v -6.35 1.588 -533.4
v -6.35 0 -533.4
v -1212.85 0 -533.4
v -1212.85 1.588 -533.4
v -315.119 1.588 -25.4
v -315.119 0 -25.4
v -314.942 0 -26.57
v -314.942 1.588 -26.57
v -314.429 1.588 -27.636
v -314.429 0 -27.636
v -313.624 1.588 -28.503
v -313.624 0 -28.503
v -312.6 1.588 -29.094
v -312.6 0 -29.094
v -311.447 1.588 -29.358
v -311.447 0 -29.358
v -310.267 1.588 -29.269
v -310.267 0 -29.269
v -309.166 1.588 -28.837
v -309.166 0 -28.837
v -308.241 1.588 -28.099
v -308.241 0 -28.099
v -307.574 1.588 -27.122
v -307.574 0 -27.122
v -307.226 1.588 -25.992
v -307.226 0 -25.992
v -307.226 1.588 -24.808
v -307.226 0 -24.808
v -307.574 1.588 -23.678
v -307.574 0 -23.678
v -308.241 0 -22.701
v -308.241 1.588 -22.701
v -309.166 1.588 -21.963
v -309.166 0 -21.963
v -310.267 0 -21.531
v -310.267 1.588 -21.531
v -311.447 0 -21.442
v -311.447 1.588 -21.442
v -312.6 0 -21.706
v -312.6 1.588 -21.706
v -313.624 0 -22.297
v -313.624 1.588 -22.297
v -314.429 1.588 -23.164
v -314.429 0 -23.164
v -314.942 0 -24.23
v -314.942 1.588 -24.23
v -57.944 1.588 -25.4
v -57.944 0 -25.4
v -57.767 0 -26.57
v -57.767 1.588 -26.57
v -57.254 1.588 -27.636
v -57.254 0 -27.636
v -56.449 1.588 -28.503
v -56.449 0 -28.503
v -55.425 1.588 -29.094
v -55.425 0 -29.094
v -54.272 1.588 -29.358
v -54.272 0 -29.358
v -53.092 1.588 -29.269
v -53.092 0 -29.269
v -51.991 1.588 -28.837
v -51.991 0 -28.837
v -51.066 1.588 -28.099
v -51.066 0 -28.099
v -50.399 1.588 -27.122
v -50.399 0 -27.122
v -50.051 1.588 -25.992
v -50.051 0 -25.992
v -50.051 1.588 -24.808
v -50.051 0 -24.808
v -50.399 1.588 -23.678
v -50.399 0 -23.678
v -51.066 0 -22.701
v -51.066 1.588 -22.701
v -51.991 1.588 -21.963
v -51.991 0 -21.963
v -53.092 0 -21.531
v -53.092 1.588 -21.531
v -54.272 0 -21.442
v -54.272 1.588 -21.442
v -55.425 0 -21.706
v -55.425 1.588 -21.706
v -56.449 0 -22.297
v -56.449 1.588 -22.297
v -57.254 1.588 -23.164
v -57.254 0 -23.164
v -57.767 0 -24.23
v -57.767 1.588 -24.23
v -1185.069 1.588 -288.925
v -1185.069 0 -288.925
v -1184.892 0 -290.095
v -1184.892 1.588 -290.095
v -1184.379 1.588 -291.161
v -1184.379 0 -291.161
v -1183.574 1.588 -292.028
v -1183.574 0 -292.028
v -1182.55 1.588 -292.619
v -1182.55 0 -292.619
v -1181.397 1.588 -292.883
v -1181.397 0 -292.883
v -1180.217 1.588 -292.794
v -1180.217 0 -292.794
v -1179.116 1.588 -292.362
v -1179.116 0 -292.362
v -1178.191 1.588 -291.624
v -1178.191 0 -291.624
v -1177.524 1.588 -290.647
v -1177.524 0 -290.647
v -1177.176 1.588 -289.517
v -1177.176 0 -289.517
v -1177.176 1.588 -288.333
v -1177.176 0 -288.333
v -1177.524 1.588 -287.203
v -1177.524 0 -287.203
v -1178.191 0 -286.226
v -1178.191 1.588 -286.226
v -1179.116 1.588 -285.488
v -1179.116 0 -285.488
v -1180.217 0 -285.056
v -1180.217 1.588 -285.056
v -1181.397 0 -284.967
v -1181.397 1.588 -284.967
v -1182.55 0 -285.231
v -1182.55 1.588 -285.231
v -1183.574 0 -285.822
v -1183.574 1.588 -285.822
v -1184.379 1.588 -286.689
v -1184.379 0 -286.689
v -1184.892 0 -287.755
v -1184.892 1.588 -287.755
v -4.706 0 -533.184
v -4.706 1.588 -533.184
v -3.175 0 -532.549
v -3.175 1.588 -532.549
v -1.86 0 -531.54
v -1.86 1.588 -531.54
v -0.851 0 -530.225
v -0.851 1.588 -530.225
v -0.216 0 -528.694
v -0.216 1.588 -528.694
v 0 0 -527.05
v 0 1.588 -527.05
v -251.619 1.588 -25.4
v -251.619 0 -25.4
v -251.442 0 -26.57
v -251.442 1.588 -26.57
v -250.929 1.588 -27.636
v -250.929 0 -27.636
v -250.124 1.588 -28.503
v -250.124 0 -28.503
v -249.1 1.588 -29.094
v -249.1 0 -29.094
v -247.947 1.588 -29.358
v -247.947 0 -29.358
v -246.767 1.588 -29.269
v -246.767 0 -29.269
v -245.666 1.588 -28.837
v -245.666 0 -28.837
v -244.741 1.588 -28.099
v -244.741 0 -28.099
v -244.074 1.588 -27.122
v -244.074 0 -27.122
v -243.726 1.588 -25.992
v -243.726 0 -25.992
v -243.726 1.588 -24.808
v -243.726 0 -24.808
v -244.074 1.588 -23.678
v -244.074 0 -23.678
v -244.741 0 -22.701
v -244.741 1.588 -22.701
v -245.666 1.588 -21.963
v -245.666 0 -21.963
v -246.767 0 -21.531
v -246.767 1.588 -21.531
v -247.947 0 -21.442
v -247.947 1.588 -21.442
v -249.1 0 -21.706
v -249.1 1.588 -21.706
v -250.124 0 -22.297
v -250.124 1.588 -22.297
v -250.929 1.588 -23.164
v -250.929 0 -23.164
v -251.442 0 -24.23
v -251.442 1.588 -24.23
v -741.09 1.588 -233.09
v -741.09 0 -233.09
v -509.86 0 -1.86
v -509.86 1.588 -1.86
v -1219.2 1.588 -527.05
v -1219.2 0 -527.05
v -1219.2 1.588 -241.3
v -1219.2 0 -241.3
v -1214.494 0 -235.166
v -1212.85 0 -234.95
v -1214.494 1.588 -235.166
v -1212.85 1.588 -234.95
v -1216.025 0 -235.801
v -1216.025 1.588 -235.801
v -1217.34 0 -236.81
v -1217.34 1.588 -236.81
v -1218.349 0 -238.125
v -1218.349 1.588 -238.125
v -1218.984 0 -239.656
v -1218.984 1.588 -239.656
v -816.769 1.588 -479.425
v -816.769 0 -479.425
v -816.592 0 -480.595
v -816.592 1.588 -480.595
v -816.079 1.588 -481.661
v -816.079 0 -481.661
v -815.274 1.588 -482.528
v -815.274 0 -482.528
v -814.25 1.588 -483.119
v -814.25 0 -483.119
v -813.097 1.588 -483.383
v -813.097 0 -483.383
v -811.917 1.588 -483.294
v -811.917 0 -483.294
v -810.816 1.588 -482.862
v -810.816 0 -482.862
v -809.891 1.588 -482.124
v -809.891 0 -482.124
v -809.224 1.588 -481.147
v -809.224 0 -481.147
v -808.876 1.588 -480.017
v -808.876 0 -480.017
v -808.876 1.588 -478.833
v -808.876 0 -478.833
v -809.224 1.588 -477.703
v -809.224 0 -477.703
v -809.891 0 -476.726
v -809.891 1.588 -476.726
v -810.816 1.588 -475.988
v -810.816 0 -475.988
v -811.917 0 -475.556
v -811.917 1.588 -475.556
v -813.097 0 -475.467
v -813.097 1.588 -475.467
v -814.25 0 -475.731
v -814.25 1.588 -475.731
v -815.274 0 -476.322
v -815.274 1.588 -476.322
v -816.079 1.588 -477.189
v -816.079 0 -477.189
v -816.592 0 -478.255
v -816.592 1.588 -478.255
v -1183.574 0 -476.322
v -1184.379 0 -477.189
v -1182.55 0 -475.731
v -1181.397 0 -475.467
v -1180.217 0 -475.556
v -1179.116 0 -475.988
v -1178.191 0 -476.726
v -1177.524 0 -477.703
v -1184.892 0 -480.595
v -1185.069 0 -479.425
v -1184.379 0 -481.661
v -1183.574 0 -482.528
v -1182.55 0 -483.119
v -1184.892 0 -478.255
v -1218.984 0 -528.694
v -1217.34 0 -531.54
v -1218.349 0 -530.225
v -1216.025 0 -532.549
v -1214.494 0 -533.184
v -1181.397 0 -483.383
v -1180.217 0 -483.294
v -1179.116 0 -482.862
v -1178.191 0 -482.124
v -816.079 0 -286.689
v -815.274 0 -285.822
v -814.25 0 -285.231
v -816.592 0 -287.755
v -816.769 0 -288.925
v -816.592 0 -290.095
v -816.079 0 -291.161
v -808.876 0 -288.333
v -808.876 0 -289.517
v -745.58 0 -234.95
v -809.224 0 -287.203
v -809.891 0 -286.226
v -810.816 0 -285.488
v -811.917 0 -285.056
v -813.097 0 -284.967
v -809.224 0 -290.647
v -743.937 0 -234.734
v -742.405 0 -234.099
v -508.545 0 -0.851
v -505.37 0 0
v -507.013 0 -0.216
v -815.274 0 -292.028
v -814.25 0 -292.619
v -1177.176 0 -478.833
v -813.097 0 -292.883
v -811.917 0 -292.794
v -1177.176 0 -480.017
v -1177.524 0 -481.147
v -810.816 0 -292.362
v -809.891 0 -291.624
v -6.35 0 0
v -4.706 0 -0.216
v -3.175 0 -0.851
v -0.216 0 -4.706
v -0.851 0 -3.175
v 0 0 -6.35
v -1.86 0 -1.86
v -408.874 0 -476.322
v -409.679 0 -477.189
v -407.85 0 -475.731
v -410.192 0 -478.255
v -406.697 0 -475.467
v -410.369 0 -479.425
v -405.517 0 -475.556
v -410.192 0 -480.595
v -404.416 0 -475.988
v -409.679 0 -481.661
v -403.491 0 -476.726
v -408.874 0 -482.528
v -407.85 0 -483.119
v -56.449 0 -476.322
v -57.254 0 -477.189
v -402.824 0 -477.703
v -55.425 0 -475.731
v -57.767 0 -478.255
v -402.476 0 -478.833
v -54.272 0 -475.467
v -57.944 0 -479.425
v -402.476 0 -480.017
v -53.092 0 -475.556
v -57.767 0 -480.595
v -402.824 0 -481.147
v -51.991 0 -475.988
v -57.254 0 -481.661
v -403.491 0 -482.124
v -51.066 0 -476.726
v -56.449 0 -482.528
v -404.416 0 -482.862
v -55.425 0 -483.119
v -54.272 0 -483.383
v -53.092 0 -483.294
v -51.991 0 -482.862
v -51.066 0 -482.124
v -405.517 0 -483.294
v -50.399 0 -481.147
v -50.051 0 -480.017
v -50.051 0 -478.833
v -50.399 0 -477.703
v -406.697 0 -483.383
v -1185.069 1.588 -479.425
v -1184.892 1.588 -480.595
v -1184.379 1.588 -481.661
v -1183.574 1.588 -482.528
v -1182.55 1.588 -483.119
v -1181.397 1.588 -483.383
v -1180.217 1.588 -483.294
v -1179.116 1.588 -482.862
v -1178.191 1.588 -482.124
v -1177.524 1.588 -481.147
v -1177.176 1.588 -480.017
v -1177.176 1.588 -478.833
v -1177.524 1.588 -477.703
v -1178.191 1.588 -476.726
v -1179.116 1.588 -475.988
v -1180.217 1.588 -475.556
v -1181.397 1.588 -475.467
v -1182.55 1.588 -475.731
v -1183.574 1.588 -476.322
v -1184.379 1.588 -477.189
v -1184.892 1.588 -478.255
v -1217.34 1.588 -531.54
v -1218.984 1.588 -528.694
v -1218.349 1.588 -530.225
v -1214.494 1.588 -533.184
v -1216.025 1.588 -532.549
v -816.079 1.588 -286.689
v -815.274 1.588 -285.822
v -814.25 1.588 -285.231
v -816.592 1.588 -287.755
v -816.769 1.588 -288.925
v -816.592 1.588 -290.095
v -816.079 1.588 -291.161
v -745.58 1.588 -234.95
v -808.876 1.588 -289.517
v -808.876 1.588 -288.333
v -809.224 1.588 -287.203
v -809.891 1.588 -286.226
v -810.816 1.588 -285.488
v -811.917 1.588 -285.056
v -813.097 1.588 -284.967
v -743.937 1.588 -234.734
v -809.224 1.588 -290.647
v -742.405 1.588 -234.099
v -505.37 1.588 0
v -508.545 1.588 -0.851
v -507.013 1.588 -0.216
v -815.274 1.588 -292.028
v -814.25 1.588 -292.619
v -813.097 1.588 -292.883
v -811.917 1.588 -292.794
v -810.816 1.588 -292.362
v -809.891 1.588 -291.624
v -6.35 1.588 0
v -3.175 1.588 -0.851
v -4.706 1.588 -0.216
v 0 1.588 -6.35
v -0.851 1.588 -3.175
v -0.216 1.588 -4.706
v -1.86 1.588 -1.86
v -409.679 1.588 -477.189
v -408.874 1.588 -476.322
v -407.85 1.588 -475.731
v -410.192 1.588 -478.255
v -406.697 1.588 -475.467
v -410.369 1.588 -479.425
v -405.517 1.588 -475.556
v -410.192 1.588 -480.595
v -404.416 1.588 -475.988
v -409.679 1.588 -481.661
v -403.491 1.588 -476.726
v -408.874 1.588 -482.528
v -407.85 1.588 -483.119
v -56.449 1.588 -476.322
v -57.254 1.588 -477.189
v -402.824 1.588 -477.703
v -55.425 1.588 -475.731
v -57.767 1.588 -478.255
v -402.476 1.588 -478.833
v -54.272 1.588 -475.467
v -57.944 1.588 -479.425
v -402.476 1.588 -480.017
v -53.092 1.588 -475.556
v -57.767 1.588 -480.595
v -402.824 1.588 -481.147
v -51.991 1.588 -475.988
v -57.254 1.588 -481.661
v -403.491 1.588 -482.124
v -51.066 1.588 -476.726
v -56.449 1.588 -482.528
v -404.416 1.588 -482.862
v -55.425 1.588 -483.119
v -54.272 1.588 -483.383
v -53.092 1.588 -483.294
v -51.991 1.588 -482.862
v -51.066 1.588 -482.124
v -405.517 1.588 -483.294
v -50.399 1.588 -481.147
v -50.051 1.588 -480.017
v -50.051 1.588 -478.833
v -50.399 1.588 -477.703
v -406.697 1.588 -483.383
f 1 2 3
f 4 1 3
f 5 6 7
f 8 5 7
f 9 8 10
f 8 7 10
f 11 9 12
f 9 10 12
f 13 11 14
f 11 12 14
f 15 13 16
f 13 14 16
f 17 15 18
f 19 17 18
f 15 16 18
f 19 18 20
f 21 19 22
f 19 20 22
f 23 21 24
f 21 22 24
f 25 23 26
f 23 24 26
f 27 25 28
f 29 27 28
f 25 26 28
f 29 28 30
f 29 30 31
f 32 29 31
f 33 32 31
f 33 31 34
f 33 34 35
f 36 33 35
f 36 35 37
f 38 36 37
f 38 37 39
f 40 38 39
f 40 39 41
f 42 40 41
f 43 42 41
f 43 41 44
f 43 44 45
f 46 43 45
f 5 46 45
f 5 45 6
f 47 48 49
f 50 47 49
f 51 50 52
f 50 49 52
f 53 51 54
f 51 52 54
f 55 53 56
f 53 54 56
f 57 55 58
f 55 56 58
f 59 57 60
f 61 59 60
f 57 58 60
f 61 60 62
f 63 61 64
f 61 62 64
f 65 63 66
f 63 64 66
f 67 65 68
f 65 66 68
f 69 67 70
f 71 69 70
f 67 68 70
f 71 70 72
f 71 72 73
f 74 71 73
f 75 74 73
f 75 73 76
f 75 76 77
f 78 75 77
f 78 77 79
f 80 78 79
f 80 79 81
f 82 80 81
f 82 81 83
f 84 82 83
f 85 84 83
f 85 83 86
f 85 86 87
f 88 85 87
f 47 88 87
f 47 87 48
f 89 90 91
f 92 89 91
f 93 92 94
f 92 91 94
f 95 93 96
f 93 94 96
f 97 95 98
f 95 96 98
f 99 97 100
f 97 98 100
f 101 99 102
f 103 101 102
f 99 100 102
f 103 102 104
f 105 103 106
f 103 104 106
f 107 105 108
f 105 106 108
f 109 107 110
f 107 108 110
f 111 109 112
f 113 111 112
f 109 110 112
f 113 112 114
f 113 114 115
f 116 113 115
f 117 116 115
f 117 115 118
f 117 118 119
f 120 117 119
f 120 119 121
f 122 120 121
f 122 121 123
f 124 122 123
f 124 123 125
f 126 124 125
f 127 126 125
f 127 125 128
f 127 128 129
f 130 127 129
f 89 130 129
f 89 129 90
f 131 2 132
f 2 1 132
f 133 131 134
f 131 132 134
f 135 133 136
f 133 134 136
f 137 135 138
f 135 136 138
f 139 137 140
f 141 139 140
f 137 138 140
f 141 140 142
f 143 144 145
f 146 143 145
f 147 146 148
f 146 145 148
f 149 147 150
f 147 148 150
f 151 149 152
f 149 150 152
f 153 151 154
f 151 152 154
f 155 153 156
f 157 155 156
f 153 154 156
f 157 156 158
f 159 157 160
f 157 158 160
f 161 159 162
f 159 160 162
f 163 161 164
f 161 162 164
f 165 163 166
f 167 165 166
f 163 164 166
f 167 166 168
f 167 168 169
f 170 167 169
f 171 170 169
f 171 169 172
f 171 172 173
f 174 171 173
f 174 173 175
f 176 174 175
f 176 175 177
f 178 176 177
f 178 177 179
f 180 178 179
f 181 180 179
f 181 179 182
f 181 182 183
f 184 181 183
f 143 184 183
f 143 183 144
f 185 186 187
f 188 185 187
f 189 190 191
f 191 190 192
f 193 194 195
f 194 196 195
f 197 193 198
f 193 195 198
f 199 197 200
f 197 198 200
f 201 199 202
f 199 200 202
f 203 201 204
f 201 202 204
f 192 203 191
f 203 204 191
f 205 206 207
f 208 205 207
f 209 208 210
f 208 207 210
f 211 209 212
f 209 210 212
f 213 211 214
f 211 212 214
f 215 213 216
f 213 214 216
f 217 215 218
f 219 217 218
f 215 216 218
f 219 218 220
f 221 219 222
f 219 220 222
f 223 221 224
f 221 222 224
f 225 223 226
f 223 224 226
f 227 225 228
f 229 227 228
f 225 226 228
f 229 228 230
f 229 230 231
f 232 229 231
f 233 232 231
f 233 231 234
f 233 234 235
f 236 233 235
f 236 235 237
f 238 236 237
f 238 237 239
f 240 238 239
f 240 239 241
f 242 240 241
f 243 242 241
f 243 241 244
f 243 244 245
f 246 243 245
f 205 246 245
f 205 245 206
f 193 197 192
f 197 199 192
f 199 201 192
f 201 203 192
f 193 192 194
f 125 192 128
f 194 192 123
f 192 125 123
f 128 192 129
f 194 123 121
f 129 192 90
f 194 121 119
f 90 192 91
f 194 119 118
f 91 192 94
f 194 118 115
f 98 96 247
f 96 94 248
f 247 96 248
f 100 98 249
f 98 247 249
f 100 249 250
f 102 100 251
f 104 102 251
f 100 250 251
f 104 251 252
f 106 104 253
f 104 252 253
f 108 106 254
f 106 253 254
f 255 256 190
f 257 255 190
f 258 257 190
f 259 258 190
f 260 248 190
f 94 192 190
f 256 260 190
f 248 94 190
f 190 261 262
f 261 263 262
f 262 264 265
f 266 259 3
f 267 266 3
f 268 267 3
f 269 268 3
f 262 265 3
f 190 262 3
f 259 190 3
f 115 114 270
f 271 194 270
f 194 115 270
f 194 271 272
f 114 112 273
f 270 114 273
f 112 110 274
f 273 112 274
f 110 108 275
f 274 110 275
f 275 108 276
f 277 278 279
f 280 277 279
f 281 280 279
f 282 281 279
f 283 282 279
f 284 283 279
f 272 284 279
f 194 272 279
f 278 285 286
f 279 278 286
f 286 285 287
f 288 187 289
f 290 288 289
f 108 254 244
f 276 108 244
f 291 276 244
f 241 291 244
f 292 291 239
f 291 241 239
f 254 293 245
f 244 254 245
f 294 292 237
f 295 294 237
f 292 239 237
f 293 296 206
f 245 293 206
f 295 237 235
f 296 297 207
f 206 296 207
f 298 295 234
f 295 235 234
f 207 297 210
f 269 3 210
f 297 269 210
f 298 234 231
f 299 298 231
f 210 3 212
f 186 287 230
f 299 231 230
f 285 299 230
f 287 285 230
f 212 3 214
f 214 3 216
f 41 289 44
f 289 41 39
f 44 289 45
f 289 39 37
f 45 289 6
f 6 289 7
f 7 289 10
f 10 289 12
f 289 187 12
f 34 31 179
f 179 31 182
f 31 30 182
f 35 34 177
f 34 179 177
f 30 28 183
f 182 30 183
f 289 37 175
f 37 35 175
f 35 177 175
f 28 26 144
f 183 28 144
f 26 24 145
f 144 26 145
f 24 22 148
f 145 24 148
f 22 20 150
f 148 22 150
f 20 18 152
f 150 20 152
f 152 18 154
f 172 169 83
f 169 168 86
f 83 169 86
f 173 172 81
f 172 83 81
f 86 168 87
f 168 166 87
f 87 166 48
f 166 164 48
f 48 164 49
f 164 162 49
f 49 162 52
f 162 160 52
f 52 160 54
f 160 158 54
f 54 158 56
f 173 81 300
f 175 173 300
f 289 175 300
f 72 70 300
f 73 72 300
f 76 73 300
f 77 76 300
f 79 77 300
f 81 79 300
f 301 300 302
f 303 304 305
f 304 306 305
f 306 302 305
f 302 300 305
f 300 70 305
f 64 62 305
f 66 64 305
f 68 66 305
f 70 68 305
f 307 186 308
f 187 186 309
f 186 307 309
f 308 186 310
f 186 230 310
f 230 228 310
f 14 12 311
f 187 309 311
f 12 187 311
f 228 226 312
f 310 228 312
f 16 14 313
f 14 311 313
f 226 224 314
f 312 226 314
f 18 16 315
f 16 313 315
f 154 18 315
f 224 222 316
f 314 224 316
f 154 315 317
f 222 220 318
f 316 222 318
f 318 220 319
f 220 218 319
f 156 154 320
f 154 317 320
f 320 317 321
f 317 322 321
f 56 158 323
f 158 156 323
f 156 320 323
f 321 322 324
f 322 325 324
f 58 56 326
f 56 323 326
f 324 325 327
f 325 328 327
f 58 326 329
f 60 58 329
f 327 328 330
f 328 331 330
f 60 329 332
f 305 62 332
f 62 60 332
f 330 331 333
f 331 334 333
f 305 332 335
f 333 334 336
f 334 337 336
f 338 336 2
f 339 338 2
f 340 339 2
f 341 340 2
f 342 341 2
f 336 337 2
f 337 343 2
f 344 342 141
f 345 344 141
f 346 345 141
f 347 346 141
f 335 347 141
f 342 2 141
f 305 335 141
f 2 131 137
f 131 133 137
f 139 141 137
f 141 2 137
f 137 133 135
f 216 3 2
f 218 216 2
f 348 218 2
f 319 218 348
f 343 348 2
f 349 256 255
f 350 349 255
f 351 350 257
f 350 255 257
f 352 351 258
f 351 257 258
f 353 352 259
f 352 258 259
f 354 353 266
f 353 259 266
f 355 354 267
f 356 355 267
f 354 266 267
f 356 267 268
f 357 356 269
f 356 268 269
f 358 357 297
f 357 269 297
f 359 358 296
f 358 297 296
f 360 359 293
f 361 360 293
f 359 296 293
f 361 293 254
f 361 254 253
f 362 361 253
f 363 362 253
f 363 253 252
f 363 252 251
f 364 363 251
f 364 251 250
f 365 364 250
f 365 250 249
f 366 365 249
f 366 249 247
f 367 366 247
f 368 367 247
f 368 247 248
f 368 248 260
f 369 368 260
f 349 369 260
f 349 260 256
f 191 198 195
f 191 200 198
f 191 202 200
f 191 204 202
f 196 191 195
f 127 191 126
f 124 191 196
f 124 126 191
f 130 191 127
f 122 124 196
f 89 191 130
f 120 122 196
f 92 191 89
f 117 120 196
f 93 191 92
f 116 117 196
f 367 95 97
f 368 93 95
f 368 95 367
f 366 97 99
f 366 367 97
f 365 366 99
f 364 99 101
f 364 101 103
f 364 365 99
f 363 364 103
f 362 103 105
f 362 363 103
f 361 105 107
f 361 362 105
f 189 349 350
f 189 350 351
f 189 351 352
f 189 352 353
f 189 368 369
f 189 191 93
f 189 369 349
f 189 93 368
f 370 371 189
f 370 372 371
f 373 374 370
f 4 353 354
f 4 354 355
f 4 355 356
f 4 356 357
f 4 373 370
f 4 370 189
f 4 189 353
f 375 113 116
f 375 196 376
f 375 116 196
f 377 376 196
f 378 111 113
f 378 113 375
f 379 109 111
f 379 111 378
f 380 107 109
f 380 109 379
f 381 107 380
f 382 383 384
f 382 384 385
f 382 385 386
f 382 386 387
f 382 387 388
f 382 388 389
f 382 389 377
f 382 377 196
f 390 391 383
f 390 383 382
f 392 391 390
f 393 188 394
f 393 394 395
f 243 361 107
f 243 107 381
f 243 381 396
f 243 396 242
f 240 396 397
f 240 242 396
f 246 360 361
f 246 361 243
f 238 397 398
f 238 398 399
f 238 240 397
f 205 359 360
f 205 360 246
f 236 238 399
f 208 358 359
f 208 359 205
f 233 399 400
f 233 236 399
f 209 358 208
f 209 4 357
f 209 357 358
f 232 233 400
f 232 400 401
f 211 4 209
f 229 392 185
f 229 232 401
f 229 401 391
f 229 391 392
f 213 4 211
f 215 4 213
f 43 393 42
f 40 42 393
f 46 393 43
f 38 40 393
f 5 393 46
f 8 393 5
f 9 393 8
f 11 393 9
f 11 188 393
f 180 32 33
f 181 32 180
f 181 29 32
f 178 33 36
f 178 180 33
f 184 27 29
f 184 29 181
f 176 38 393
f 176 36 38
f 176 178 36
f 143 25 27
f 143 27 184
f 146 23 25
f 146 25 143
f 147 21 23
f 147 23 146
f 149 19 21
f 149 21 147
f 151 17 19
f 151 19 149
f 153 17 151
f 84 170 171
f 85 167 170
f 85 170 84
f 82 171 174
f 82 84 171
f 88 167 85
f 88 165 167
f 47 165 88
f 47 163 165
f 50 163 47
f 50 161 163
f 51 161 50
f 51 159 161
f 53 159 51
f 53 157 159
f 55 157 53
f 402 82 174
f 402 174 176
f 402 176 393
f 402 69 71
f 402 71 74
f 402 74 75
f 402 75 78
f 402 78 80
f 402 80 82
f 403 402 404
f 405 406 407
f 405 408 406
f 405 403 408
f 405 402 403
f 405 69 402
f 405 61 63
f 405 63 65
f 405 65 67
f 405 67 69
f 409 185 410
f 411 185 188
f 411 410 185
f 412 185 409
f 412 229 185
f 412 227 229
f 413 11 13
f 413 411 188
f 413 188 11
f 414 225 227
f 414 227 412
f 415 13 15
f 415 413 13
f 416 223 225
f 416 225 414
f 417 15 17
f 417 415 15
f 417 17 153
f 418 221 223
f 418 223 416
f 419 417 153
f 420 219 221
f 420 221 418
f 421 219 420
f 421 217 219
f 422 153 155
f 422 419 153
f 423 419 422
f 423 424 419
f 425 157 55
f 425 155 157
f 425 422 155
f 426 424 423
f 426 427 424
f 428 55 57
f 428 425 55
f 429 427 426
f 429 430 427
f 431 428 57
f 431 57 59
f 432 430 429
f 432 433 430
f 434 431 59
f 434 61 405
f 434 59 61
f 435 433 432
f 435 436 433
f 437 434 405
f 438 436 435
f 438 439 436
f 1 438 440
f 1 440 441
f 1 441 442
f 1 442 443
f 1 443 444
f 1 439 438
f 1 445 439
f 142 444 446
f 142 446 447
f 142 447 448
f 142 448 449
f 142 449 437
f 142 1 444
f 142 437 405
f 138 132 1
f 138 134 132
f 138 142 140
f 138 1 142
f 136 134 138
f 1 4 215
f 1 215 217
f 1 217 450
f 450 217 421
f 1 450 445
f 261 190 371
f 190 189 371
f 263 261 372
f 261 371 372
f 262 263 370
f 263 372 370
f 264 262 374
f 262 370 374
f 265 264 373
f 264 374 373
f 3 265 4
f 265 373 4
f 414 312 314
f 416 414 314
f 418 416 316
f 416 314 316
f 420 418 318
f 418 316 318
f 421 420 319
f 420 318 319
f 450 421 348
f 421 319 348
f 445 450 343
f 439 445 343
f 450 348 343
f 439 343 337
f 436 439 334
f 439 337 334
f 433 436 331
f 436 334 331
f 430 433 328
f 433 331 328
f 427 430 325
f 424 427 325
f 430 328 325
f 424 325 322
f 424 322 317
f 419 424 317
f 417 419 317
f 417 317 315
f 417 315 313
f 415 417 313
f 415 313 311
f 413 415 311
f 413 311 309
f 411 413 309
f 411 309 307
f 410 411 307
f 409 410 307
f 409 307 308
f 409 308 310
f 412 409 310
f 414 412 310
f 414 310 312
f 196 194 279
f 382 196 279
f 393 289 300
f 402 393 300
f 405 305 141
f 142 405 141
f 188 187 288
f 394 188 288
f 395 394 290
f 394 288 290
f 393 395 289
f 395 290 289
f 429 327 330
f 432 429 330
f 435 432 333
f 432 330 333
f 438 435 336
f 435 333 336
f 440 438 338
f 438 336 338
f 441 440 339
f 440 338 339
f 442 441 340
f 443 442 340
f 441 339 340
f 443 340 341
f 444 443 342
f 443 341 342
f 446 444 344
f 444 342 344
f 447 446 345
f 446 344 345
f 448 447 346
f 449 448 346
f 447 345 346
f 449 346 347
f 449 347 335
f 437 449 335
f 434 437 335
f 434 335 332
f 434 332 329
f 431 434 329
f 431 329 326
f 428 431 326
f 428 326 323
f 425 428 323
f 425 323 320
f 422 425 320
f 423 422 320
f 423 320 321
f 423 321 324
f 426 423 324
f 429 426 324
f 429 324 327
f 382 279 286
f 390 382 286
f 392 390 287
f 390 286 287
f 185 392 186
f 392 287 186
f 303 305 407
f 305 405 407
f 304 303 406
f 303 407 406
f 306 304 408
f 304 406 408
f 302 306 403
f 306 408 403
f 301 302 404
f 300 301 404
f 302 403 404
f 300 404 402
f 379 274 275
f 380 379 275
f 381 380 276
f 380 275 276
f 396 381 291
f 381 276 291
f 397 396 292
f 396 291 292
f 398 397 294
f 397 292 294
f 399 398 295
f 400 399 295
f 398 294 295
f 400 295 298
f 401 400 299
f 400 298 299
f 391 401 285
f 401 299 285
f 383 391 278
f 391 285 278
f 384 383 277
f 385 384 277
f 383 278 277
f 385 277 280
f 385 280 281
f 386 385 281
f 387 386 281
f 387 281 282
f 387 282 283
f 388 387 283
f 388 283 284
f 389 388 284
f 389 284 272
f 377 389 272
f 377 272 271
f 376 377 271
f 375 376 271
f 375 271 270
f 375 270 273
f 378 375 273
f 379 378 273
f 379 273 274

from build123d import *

# Parameters (mm, degrees)
BOSS_EXTRUDE1_DEPTH            = 1.5875
F_5_16_0_3125_DIAMETER_HOLE1_D = 7.9375
FILLET1_R                      = 6.35


with BuildPart() as part:
    # Sketch1 → Boss-Extrude1 (new body)
    with BuildSketch(Plane(origin=(0, 0, 0), x_dir=(1, 0, 0), z_dir=(0, 1, 0))):
        with BuildLine():
            Line((-1219.2, 234.95), (-745.580256121, 234.95))
            ThreePointArc((-745.580256121, 234.95), (-743.150216326, 234.466635031), (-741.090128061, 233.090128061))
            Line((-741.090128061, 233.090128061), (-509.859871939, 1.859871939))
            ThreePointArc((-509.859871939, 1.859871939), (-507.799783674, 0.483364969), (-505.369743879, 0))
            Line((-505.369743879, 0), (0, 0))
            Line((0, 0), (0, 533.4))
            Line((0, 533.4), (-1219.2, 533.4))
            Line((-1219.2, 533.4), (-1219.2, 234.95))
        make_face()
    extrude(amount=BOSS_EXTRUDE1_DEPTH)

    # 5/16 (0.3125) Diameter Hole1 (through all)
    with Locations(Plane(origin=(0, 1.5875, 0), x_dir=(1, 0, 0), z_dir=(0, 1, 0))):
        with Locations((-1181.1, 479.425), (-1181.1, 288.925), (-812.8, 288.925), (-812.8, 479.425), (-406.4, 479.425), (-53.975, 479.425), (-53.975, 25.4), (-247.65, 25.4), (-311.15, 25.4)):
            Hole(F_5_16_0_3125_DIAMETER_HOLE1_D / 2)

    # Fillet1
    fillet1_edges = [part.edges().sort_by_distance(p)[0] for p in [
        (-1219.2, 0.79375, -234.95),
        (-1219.2, 0.79375, -533.4),
        (0, 0.79375, -533.4),
        (0, 0.79375, 0),
    ]]
    fillet(fillet1_edges, radius=FILLET1_R)


solid = part.part
